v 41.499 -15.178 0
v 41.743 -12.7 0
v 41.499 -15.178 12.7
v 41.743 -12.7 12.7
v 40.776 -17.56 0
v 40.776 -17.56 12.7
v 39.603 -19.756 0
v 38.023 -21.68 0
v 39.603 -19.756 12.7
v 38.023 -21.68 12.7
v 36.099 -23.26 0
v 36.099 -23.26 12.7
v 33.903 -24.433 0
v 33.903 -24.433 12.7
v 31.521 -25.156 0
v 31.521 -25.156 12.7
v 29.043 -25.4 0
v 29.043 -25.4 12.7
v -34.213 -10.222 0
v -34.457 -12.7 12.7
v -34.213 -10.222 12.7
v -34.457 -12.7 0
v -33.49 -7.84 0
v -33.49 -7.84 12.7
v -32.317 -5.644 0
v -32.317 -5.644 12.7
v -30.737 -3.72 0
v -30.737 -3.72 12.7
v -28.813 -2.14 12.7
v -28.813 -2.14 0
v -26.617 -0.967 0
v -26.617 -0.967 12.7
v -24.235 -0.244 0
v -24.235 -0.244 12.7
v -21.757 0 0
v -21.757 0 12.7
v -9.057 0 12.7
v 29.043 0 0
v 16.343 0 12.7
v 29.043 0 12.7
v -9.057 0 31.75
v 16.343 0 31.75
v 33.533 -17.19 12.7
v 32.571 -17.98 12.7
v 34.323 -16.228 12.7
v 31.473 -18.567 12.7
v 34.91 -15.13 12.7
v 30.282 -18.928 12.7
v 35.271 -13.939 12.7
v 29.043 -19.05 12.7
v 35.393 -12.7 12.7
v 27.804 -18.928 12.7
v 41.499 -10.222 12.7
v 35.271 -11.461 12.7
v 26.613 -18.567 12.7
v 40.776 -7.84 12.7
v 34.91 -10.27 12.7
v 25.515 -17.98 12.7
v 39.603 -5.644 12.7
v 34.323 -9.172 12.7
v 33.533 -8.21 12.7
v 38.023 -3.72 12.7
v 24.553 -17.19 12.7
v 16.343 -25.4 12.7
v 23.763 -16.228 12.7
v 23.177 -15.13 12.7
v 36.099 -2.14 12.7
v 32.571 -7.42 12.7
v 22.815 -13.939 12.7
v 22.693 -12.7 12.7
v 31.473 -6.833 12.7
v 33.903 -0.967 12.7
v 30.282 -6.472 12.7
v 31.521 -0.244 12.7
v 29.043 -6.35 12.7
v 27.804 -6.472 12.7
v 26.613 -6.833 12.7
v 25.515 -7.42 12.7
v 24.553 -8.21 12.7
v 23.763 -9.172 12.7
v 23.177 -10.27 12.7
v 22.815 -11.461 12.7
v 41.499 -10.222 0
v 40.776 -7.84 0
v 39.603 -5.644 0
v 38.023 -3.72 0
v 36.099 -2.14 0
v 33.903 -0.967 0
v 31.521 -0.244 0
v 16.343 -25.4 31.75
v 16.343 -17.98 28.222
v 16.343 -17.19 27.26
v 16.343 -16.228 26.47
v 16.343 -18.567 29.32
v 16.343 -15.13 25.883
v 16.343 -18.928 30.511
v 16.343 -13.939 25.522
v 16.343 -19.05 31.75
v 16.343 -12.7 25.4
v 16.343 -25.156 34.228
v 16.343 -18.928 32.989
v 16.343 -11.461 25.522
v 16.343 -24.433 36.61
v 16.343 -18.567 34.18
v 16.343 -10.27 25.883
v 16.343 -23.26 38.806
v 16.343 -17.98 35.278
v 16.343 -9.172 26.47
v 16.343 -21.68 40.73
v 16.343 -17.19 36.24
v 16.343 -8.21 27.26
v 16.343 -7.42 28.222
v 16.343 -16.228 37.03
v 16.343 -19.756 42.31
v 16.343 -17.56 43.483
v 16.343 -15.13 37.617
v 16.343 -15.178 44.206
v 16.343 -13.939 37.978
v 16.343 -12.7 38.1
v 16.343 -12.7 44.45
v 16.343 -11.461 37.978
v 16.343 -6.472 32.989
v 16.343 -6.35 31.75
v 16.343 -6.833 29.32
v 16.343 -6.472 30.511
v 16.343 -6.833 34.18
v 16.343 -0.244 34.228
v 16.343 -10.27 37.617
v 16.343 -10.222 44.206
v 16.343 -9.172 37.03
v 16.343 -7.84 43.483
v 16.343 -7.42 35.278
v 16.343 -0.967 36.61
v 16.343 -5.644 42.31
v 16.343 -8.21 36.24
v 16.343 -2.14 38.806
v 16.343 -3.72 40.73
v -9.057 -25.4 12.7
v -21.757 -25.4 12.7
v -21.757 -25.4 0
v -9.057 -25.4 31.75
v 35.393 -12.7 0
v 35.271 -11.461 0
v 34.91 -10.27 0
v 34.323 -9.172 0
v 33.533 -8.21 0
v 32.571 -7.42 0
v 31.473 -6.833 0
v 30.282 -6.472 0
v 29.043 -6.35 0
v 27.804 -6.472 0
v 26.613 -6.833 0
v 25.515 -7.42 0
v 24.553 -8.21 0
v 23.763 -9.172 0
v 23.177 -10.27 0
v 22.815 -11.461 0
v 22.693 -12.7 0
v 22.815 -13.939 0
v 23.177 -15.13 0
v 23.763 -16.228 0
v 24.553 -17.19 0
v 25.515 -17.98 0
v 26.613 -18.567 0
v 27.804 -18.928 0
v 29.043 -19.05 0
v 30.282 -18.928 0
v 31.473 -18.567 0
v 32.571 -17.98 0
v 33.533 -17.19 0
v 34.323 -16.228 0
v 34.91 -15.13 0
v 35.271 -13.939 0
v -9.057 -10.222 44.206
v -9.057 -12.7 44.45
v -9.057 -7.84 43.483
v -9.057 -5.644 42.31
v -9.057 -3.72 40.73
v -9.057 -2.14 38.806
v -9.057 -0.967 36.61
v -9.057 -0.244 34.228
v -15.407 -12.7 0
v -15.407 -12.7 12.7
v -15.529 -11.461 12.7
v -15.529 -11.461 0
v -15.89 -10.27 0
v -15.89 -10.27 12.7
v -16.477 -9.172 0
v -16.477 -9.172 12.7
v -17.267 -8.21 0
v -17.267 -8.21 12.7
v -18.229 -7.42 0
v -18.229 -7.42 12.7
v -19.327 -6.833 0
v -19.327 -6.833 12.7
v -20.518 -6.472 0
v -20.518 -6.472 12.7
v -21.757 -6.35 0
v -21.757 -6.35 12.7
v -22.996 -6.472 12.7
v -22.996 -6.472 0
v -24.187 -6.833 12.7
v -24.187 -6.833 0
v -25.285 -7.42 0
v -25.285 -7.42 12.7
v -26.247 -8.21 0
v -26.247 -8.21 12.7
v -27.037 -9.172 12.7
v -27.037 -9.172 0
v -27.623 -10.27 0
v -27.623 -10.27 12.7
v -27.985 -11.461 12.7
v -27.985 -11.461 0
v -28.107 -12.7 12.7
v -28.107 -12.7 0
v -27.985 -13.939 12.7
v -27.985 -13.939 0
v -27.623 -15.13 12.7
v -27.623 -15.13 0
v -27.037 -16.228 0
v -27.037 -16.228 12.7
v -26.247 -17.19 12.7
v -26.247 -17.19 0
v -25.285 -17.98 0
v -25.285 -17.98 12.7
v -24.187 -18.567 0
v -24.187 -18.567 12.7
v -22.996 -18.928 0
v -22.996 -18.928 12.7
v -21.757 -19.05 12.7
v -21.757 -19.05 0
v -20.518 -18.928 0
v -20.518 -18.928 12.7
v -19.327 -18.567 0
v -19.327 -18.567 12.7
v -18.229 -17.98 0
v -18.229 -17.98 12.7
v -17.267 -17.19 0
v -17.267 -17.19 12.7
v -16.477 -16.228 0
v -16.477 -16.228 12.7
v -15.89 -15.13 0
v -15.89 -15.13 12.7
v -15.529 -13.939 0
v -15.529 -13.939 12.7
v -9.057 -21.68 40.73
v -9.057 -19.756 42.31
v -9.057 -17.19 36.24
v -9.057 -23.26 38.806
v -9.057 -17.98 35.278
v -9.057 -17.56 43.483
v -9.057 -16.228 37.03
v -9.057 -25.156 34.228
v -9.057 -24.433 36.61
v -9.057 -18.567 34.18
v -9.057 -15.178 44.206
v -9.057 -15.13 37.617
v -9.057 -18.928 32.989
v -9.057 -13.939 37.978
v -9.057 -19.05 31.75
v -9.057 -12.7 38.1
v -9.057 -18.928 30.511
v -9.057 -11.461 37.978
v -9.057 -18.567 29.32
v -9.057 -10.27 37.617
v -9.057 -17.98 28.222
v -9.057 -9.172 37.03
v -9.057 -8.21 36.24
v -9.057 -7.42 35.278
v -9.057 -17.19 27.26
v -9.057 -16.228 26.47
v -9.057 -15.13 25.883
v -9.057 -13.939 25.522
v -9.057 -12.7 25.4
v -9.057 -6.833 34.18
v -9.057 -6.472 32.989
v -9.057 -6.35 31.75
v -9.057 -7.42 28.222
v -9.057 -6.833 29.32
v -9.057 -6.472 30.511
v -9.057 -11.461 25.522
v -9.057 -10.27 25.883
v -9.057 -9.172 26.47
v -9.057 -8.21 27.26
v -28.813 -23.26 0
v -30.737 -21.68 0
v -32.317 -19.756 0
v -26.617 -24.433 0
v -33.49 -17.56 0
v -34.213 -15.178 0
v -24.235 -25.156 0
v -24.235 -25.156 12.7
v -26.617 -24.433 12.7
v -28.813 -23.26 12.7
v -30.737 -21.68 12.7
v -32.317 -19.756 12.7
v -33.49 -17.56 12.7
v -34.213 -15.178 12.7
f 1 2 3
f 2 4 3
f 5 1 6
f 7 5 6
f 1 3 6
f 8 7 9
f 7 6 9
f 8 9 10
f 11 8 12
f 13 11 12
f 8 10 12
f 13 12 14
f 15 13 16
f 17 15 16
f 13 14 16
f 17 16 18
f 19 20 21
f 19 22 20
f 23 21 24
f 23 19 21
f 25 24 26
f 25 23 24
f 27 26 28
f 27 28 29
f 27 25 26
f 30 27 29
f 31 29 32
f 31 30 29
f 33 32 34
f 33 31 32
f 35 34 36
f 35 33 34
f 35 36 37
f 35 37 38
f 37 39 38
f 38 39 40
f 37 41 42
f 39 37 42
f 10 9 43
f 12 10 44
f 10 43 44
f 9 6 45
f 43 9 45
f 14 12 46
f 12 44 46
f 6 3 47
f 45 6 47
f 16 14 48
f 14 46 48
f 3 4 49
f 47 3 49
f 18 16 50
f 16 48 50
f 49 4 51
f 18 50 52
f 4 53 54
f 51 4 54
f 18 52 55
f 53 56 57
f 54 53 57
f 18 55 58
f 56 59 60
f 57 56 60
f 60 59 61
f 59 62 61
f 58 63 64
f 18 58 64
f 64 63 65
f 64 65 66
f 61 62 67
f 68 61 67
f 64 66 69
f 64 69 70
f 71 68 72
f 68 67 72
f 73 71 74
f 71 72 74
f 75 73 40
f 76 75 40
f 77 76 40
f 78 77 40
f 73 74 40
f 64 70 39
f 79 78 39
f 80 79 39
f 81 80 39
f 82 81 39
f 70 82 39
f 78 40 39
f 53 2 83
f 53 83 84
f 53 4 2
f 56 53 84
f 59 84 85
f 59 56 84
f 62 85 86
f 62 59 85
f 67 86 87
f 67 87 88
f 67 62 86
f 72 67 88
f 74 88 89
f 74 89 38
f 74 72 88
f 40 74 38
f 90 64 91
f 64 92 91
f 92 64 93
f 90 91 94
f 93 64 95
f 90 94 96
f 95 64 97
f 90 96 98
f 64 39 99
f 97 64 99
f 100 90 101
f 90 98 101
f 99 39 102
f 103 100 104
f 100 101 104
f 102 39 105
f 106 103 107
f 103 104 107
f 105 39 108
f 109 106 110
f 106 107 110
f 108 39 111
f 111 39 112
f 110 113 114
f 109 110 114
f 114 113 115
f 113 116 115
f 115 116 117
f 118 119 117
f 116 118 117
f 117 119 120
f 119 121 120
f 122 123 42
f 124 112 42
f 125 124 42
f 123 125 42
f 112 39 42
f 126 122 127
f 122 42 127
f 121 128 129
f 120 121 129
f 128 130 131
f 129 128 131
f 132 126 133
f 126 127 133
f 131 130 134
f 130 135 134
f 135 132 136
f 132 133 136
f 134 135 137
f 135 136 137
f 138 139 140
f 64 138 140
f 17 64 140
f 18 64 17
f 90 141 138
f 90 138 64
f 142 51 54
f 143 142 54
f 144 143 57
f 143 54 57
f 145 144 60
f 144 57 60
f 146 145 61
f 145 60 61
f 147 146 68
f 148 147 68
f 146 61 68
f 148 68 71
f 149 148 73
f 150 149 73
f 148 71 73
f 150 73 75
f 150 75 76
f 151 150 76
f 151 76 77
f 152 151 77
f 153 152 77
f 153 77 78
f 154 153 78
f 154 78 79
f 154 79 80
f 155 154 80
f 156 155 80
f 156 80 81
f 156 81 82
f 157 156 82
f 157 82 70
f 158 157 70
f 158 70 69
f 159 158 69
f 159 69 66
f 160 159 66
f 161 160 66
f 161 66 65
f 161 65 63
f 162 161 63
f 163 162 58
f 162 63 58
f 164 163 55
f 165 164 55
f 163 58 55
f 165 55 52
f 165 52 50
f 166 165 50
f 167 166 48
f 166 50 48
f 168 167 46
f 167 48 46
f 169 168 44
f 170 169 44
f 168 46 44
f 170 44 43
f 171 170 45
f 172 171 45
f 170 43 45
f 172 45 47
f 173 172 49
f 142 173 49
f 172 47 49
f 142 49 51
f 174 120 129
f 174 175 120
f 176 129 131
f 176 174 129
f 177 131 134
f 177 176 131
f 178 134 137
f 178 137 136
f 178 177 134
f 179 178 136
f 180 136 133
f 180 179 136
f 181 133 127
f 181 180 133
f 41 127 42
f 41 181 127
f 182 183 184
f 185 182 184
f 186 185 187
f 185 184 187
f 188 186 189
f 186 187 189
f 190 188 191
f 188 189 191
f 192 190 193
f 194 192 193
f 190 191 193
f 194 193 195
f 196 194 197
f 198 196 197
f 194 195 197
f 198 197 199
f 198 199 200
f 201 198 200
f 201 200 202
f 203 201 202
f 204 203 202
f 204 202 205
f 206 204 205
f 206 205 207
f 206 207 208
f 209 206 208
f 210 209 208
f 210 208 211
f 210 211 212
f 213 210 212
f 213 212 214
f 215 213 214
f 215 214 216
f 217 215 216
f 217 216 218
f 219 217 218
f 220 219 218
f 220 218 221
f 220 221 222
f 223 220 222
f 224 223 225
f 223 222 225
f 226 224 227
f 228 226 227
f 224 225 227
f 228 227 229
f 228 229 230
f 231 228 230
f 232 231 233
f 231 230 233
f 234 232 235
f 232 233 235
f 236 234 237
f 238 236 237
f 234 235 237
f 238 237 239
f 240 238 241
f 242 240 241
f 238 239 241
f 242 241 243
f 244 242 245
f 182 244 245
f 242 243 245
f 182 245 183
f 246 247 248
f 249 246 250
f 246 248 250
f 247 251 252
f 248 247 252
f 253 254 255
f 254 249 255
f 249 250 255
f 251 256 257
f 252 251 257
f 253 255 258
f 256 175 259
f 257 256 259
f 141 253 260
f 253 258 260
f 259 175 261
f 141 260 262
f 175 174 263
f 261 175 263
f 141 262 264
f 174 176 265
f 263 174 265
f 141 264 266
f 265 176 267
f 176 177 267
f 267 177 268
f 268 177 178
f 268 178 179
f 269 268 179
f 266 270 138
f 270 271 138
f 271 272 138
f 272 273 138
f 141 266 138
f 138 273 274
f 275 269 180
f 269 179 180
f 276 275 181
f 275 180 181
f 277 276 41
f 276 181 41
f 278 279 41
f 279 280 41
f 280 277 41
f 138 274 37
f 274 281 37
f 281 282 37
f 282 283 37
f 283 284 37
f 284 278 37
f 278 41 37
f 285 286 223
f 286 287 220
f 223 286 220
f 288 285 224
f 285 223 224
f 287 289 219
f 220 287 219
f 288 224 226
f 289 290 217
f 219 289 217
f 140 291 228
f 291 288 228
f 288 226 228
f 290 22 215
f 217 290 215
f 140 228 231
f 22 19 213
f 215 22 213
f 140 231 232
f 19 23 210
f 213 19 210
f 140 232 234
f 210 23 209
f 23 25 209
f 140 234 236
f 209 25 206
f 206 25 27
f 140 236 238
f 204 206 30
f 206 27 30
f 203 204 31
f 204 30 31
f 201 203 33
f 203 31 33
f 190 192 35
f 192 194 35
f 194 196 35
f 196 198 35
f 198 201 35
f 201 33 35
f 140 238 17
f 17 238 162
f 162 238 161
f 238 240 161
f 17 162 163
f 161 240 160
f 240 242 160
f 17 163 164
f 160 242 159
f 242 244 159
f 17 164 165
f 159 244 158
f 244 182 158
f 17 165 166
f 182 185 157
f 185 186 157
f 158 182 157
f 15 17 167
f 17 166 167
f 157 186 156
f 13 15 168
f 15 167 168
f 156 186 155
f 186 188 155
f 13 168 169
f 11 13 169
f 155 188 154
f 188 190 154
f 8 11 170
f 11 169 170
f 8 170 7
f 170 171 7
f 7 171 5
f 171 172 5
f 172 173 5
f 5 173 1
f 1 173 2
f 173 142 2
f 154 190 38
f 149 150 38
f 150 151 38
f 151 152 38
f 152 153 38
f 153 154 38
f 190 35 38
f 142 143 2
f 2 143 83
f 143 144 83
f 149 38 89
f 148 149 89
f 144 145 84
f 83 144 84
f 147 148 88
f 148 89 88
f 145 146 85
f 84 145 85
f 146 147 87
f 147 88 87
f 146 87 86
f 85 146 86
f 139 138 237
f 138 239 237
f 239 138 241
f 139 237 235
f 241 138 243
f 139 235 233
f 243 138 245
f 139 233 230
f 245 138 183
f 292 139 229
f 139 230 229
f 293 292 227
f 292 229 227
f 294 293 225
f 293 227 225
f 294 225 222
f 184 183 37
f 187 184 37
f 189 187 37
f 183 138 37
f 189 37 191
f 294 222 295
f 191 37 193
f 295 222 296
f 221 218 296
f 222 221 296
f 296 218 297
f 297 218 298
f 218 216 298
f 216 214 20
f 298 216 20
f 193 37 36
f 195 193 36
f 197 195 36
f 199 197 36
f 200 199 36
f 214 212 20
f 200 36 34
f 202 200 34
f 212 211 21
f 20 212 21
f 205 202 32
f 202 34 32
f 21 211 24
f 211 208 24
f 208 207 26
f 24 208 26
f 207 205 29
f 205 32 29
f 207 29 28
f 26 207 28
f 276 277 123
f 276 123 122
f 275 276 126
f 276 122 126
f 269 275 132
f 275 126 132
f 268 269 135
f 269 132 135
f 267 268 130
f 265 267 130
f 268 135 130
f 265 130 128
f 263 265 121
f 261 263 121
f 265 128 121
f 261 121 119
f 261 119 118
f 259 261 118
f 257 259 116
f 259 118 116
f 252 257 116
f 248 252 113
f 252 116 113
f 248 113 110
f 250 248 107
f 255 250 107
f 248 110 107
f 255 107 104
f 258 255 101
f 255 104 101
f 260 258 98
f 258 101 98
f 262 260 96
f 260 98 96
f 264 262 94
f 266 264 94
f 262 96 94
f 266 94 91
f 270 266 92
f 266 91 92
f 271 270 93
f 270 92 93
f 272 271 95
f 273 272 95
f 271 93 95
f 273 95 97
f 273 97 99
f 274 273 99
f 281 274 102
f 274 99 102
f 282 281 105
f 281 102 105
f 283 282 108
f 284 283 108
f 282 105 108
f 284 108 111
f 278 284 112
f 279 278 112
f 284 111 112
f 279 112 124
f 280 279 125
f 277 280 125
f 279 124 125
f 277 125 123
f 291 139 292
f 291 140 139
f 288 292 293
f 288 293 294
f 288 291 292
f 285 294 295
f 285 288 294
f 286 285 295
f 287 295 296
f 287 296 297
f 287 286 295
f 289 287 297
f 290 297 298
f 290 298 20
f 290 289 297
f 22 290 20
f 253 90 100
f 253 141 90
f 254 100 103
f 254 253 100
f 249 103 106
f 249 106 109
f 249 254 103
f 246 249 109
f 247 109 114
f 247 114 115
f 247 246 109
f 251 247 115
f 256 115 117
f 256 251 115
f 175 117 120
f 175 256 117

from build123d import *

# Parameters (mm, degrees)
F1_DEPTH  = 25.4
F2_R      = 12.7
F3_R      = 12.69999
F4_R      = 12.7
F5_R      = 12.69999
F6_R      = 12.7
F7_R      = 12.69999
F8_R      = 6.35
F9_DEPTH  = 25.4
F10_R     = 6.35
F11_DEPTH = 25.4
F12_R     = 6.35
F13_DEPTH = 25.4


# Not quite as in the source:
# - a fillet or chamfer is up to 0.001 mm smaller than in the source, because OpenCascade refuses the exact size


with BuildPart() as f1:
    # F0 (on Front) → F1 (new body)
    with BuildSketch(Plane.XZ):
        Polygon((-34.4568602741, 12.7), (-34.4568602741, 0), (41.7431397259, 0), (41.7431397259, 12.7), (16.3431397259, 12.7), (16.3431397259, 44.45), (-9.0568602741, 44.45), (-9.0568602741, 12.7), align=None)
    extrude(amount=F1_DEPTH)

    # F2
    f2_edges = [f1.edges().sort_by_distance(p)[0] for p in [
        (41.74314, -25.4, 6.35),
    ]]
    fillet(f2_edges, radius=F2_R)

    # F3 (radius 12.7 in the source; OpenCascade refuses exactly that, so slightly less here)
    f3_edges = [f1.edges().sort_by_distance(p)[0] for p in [
        (41.74314, 0, 6.35),
    ]]
    fillet(f3_edges, radius=F3_R)

    # F4
    f4_edges = [f1.edges().sort_by_distance(p)[0] for p in [
        (-34.45686, -25.4, 6.35),
    ]]
    fillet(f4_edges, radius=F4_R)

    # F5 (radius 12.7 in the source; OpenCascade refuses exactly that, so slightly less here)
    f5_edges = [f1.edges().sort_by_distance(p)[0] for p in [
        (-34.45686, 0, 6.35),
    ]]
    fillet(f5_edges, radius=F5_R)

    # F6
    f6_edges = [f1.edges().sort_by_distance(p)[0] for p in [
        (3.64314, -25.4, 44.45),
    ]]
    fillet(f6_edges, radius=F6_R)

    # F7 (radius 12.7 in the source; OpenCascade refuses exactly that, so slightly less here)
    f7_edges = [f1.edges().sort_by_distance(p)[0] for p in [
        (3.64314, 0, 44.45),
    ]]
    fillet(f7_edges, radius=F7_R)

    # F8 (on face) → F9 (cut)
    with BuildSketch(Plane.XY.offset(12.7)):
        with Locations((29.0431397259, -12.7)):
            Circle(F8_R)
    extrude(amount=-F9_DEPTH, mode=Mode.SUBTRACT)

    # F10 (on face) → F11 (cut)
    with BuildSketch(Plane.XY.offset(12.7)):
        with Locations((-21.7568602741, -12.7)):
            Circle(F10_R)
    extrude(amount=-F11_DEPTH, mode=Mode.SUBTRACT)

    # F12 (on face) → F13 (cut)
    with BuildSketch(Plane.YZ.offset(16.3431397259)):
        with Locations((-12.7, 31.75)):
            Circle(F12_R)
    extrude(amount=-F13_DEPTH, mode=Mode.SUBTRACT)


solid = f1.part
